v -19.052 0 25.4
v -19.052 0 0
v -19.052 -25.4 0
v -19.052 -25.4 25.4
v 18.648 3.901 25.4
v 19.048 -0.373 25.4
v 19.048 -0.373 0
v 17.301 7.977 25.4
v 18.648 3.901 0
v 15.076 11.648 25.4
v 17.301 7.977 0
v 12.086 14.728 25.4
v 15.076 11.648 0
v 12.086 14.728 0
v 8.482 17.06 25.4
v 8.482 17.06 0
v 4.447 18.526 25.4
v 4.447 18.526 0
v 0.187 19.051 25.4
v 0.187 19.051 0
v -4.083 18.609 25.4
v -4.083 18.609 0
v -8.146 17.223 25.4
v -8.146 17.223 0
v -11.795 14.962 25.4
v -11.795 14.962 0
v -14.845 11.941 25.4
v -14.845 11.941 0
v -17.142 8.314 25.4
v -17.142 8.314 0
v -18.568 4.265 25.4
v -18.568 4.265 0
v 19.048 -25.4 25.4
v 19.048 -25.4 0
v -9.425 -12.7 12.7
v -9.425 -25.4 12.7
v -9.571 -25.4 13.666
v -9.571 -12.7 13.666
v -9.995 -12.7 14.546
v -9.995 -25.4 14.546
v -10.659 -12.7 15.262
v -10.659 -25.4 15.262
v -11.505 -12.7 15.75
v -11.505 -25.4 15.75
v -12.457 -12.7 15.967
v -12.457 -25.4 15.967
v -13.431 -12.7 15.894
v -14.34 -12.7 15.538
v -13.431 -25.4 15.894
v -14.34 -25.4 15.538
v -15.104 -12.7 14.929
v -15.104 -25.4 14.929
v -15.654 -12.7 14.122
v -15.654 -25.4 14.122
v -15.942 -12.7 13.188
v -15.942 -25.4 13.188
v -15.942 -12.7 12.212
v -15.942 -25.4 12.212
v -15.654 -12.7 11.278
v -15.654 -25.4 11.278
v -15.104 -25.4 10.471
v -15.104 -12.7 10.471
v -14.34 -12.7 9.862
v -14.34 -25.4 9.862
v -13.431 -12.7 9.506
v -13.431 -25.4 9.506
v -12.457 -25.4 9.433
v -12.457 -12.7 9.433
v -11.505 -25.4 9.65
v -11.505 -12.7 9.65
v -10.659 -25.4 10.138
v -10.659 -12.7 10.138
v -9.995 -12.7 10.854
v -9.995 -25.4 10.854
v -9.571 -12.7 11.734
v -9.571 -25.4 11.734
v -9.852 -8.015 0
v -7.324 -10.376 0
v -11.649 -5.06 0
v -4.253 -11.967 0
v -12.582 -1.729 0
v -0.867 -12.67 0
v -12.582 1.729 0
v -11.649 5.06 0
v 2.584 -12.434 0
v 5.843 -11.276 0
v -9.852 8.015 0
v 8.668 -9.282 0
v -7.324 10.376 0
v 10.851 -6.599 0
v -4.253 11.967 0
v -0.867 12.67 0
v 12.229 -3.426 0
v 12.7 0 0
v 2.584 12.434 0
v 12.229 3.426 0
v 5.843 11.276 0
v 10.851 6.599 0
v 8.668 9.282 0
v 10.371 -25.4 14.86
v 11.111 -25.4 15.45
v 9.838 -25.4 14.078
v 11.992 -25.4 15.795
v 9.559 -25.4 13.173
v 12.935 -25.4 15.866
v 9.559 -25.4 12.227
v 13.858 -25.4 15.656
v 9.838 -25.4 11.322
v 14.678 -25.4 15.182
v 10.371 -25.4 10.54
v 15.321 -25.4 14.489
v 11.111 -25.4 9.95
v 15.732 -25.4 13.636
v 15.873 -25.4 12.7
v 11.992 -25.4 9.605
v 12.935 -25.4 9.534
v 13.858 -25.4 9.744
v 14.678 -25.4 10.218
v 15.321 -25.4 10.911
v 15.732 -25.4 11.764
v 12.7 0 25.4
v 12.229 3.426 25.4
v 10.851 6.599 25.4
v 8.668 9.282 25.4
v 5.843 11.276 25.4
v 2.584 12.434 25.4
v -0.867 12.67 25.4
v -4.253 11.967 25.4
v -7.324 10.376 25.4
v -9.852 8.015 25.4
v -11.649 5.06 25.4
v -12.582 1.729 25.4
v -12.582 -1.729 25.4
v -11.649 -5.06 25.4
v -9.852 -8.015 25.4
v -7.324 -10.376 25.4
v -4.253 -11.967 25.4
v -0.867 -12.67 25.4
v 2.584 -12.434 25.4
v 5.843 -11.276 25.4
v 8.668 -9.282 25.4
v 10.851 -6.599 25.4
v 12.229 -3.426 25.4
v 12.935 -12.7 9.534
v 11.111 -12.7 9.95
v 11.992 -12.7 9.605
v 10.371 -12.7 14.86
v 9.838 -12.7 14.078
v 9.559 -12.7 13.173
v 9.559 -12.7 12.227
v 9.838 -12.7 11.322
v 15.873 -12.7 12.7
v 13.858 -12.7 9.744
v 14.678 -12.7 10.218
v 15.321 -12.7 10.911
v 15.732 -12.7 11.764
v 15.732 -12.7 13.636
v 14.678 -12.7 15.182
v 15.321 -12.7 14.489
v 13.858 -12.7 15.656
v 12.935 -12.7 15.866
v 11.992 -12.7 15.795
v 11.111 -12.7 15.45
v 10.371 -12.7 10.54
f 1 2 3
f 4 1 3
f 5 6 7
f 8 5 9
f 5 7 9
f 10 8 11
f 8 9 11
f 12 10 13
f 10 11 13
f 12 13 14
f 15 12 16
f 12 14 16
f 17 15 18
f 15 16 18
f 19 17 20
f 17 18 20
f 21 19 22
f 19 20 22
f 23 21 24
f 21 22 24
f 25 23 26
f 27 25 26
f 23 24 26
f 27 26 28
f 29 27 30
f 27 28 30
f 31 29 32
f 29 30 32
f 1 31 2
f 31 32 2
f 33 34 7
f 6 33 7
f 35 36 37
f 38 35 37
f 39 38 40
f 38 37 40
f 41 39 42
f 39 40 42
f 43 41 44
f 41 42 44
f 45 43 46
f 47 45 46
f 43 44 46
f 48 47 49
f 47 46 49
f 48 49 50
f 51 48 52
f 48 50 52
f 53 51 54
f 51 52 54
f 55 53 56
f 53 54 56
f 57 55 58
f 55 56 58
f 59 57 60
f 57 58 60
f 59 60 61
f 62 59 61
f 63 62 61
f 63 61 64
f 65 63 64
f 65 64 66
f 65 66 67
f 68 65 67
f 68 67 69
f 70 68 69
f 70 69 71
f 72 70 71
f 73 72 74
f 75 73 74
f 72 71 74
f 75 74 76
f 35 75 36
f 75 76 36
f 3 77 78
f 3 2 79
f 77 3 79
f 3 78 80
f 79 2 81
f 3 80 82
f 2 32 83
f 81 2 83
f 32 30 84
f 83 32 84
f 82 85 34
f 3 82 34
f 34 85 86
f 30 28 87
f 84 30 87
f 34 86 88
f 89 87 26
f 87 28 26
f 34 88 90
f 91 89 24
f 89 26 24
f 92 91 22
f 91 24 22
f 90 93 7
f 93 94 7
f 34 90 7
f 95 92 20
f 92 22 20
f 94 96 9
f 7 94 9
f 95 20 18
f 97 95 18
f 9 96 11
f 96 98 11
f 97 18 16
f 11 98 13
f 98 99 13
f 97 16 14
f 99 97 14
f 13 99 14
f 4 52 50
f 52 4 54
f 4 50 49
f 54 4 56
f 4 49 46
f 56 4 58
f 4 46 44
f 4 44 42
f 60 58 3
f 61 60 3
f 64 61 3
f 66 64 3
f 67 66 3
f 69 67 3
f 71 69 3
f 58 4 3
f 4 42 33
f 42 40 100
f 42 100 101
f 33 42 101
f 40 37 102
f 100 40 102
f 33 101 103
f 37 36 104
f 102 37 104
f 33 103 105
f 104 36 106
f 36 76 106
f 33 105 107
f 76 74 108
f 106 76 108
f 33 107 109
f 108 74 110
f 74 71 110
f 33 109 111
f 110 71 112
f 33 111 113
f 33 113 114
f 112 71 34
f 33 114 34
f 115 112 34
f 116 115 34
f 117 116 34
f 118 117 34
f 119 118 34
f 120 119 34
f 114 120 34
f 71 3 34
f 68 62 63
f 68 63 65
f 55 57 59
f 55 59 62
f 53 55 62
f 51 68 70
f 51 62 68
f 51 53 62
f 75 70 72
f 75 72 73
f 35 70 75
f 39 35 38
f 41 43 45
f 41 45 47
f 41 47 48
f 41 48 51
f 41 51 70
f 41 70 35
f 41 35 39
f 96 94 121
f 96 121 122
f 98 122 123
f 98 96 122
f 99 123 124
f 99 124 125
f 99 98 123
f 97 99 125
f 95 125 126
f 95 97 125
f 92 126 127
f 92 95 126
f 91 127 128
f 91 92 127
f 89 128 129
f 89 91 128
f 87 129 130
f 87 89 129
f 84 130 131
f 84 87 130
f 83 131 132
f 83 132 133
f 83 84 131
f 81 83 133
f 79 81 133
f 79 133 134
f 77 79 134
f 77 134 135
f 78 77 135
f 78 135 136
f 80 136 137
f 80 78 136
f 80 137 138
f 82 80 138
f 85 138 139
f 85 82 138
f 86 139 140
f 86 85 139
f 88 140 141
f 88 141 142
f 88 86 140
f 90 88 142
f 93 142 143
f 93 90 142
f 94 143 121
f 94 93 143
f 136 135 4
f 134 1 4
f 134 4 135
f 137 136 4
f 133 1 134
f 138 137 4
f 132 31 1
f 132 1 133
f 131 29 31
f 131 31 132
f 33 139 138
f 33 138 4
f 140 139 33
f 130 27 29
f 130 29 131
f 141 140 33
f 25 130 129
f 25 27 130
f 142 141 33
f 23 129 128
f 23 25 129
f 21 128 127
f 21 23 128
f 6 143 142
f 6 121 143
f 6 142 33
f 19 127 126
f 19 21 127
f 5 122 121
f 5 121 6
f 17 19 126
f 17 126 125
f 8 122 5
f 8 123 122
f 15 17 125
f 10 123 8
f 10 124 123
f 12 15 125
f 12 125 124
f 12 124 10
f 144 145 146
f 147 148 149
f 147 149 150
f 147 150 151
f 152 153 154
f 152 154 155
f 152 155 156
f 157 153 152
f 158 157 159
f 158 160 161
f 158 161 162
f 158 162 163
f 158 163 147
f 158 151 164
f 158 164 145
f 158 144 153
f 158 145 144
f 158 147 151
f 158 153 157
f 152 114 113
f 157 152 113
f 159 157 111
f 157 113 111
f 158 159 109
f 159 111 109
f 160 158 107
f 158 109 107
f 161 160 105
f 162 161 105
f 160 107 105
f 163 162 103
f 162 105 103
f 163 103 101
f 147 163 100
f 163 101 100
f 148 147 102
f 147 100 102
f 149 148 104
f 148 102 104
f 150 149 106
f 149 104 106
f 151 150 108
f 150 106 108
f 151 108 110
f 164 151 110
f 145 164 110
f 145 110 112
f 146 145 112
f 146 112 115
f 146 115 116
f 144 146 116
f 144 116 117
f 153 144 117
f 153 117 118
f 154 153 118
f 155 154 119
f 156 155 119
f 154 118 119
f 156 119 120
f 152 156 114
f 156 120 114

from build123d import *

# Parameters (mm, degrees)
F0_R     = 12.7
F1_DEPTH = 25.4
F2_R     = 3.2766
F2_R_2   = 3.175
F3_DEPTH = 12.7


with BuildPart() as f1:
    # F0 (on Top) → F1 (new body)
    with BuildSketch(Plane.XY):
        with BuildLine():
            Line((19.048172, -25.4), (19.048172, -0.373213))
            ThreePointArc((19.048172, -0.373213), (0.186616, 19.050914), (-19.051828, 0))
            Line((-19.051828, 0), (-19.051828, -25.4))
            Line((-19.051828, -25.4), (19.048172, -25.4))
        make_face()
        Circle(F0_R, mode=Mode.SUBTRACT)
    extrude(amount=F1_DEPTH)

    # F2 (on face) → F3 (cut)
    with BuildSketch(Plane.XZ.offset(25.4)):
        with Locations((-12.701828, 12.7)):
            Circle(F2_R)
        with Locations((12.698172, 12.7)):
            Circle(F2_R_2)
    extrude(amount=-F3_DEPTH, mode=Mode.SUBTRACT)


solid = f1.part
